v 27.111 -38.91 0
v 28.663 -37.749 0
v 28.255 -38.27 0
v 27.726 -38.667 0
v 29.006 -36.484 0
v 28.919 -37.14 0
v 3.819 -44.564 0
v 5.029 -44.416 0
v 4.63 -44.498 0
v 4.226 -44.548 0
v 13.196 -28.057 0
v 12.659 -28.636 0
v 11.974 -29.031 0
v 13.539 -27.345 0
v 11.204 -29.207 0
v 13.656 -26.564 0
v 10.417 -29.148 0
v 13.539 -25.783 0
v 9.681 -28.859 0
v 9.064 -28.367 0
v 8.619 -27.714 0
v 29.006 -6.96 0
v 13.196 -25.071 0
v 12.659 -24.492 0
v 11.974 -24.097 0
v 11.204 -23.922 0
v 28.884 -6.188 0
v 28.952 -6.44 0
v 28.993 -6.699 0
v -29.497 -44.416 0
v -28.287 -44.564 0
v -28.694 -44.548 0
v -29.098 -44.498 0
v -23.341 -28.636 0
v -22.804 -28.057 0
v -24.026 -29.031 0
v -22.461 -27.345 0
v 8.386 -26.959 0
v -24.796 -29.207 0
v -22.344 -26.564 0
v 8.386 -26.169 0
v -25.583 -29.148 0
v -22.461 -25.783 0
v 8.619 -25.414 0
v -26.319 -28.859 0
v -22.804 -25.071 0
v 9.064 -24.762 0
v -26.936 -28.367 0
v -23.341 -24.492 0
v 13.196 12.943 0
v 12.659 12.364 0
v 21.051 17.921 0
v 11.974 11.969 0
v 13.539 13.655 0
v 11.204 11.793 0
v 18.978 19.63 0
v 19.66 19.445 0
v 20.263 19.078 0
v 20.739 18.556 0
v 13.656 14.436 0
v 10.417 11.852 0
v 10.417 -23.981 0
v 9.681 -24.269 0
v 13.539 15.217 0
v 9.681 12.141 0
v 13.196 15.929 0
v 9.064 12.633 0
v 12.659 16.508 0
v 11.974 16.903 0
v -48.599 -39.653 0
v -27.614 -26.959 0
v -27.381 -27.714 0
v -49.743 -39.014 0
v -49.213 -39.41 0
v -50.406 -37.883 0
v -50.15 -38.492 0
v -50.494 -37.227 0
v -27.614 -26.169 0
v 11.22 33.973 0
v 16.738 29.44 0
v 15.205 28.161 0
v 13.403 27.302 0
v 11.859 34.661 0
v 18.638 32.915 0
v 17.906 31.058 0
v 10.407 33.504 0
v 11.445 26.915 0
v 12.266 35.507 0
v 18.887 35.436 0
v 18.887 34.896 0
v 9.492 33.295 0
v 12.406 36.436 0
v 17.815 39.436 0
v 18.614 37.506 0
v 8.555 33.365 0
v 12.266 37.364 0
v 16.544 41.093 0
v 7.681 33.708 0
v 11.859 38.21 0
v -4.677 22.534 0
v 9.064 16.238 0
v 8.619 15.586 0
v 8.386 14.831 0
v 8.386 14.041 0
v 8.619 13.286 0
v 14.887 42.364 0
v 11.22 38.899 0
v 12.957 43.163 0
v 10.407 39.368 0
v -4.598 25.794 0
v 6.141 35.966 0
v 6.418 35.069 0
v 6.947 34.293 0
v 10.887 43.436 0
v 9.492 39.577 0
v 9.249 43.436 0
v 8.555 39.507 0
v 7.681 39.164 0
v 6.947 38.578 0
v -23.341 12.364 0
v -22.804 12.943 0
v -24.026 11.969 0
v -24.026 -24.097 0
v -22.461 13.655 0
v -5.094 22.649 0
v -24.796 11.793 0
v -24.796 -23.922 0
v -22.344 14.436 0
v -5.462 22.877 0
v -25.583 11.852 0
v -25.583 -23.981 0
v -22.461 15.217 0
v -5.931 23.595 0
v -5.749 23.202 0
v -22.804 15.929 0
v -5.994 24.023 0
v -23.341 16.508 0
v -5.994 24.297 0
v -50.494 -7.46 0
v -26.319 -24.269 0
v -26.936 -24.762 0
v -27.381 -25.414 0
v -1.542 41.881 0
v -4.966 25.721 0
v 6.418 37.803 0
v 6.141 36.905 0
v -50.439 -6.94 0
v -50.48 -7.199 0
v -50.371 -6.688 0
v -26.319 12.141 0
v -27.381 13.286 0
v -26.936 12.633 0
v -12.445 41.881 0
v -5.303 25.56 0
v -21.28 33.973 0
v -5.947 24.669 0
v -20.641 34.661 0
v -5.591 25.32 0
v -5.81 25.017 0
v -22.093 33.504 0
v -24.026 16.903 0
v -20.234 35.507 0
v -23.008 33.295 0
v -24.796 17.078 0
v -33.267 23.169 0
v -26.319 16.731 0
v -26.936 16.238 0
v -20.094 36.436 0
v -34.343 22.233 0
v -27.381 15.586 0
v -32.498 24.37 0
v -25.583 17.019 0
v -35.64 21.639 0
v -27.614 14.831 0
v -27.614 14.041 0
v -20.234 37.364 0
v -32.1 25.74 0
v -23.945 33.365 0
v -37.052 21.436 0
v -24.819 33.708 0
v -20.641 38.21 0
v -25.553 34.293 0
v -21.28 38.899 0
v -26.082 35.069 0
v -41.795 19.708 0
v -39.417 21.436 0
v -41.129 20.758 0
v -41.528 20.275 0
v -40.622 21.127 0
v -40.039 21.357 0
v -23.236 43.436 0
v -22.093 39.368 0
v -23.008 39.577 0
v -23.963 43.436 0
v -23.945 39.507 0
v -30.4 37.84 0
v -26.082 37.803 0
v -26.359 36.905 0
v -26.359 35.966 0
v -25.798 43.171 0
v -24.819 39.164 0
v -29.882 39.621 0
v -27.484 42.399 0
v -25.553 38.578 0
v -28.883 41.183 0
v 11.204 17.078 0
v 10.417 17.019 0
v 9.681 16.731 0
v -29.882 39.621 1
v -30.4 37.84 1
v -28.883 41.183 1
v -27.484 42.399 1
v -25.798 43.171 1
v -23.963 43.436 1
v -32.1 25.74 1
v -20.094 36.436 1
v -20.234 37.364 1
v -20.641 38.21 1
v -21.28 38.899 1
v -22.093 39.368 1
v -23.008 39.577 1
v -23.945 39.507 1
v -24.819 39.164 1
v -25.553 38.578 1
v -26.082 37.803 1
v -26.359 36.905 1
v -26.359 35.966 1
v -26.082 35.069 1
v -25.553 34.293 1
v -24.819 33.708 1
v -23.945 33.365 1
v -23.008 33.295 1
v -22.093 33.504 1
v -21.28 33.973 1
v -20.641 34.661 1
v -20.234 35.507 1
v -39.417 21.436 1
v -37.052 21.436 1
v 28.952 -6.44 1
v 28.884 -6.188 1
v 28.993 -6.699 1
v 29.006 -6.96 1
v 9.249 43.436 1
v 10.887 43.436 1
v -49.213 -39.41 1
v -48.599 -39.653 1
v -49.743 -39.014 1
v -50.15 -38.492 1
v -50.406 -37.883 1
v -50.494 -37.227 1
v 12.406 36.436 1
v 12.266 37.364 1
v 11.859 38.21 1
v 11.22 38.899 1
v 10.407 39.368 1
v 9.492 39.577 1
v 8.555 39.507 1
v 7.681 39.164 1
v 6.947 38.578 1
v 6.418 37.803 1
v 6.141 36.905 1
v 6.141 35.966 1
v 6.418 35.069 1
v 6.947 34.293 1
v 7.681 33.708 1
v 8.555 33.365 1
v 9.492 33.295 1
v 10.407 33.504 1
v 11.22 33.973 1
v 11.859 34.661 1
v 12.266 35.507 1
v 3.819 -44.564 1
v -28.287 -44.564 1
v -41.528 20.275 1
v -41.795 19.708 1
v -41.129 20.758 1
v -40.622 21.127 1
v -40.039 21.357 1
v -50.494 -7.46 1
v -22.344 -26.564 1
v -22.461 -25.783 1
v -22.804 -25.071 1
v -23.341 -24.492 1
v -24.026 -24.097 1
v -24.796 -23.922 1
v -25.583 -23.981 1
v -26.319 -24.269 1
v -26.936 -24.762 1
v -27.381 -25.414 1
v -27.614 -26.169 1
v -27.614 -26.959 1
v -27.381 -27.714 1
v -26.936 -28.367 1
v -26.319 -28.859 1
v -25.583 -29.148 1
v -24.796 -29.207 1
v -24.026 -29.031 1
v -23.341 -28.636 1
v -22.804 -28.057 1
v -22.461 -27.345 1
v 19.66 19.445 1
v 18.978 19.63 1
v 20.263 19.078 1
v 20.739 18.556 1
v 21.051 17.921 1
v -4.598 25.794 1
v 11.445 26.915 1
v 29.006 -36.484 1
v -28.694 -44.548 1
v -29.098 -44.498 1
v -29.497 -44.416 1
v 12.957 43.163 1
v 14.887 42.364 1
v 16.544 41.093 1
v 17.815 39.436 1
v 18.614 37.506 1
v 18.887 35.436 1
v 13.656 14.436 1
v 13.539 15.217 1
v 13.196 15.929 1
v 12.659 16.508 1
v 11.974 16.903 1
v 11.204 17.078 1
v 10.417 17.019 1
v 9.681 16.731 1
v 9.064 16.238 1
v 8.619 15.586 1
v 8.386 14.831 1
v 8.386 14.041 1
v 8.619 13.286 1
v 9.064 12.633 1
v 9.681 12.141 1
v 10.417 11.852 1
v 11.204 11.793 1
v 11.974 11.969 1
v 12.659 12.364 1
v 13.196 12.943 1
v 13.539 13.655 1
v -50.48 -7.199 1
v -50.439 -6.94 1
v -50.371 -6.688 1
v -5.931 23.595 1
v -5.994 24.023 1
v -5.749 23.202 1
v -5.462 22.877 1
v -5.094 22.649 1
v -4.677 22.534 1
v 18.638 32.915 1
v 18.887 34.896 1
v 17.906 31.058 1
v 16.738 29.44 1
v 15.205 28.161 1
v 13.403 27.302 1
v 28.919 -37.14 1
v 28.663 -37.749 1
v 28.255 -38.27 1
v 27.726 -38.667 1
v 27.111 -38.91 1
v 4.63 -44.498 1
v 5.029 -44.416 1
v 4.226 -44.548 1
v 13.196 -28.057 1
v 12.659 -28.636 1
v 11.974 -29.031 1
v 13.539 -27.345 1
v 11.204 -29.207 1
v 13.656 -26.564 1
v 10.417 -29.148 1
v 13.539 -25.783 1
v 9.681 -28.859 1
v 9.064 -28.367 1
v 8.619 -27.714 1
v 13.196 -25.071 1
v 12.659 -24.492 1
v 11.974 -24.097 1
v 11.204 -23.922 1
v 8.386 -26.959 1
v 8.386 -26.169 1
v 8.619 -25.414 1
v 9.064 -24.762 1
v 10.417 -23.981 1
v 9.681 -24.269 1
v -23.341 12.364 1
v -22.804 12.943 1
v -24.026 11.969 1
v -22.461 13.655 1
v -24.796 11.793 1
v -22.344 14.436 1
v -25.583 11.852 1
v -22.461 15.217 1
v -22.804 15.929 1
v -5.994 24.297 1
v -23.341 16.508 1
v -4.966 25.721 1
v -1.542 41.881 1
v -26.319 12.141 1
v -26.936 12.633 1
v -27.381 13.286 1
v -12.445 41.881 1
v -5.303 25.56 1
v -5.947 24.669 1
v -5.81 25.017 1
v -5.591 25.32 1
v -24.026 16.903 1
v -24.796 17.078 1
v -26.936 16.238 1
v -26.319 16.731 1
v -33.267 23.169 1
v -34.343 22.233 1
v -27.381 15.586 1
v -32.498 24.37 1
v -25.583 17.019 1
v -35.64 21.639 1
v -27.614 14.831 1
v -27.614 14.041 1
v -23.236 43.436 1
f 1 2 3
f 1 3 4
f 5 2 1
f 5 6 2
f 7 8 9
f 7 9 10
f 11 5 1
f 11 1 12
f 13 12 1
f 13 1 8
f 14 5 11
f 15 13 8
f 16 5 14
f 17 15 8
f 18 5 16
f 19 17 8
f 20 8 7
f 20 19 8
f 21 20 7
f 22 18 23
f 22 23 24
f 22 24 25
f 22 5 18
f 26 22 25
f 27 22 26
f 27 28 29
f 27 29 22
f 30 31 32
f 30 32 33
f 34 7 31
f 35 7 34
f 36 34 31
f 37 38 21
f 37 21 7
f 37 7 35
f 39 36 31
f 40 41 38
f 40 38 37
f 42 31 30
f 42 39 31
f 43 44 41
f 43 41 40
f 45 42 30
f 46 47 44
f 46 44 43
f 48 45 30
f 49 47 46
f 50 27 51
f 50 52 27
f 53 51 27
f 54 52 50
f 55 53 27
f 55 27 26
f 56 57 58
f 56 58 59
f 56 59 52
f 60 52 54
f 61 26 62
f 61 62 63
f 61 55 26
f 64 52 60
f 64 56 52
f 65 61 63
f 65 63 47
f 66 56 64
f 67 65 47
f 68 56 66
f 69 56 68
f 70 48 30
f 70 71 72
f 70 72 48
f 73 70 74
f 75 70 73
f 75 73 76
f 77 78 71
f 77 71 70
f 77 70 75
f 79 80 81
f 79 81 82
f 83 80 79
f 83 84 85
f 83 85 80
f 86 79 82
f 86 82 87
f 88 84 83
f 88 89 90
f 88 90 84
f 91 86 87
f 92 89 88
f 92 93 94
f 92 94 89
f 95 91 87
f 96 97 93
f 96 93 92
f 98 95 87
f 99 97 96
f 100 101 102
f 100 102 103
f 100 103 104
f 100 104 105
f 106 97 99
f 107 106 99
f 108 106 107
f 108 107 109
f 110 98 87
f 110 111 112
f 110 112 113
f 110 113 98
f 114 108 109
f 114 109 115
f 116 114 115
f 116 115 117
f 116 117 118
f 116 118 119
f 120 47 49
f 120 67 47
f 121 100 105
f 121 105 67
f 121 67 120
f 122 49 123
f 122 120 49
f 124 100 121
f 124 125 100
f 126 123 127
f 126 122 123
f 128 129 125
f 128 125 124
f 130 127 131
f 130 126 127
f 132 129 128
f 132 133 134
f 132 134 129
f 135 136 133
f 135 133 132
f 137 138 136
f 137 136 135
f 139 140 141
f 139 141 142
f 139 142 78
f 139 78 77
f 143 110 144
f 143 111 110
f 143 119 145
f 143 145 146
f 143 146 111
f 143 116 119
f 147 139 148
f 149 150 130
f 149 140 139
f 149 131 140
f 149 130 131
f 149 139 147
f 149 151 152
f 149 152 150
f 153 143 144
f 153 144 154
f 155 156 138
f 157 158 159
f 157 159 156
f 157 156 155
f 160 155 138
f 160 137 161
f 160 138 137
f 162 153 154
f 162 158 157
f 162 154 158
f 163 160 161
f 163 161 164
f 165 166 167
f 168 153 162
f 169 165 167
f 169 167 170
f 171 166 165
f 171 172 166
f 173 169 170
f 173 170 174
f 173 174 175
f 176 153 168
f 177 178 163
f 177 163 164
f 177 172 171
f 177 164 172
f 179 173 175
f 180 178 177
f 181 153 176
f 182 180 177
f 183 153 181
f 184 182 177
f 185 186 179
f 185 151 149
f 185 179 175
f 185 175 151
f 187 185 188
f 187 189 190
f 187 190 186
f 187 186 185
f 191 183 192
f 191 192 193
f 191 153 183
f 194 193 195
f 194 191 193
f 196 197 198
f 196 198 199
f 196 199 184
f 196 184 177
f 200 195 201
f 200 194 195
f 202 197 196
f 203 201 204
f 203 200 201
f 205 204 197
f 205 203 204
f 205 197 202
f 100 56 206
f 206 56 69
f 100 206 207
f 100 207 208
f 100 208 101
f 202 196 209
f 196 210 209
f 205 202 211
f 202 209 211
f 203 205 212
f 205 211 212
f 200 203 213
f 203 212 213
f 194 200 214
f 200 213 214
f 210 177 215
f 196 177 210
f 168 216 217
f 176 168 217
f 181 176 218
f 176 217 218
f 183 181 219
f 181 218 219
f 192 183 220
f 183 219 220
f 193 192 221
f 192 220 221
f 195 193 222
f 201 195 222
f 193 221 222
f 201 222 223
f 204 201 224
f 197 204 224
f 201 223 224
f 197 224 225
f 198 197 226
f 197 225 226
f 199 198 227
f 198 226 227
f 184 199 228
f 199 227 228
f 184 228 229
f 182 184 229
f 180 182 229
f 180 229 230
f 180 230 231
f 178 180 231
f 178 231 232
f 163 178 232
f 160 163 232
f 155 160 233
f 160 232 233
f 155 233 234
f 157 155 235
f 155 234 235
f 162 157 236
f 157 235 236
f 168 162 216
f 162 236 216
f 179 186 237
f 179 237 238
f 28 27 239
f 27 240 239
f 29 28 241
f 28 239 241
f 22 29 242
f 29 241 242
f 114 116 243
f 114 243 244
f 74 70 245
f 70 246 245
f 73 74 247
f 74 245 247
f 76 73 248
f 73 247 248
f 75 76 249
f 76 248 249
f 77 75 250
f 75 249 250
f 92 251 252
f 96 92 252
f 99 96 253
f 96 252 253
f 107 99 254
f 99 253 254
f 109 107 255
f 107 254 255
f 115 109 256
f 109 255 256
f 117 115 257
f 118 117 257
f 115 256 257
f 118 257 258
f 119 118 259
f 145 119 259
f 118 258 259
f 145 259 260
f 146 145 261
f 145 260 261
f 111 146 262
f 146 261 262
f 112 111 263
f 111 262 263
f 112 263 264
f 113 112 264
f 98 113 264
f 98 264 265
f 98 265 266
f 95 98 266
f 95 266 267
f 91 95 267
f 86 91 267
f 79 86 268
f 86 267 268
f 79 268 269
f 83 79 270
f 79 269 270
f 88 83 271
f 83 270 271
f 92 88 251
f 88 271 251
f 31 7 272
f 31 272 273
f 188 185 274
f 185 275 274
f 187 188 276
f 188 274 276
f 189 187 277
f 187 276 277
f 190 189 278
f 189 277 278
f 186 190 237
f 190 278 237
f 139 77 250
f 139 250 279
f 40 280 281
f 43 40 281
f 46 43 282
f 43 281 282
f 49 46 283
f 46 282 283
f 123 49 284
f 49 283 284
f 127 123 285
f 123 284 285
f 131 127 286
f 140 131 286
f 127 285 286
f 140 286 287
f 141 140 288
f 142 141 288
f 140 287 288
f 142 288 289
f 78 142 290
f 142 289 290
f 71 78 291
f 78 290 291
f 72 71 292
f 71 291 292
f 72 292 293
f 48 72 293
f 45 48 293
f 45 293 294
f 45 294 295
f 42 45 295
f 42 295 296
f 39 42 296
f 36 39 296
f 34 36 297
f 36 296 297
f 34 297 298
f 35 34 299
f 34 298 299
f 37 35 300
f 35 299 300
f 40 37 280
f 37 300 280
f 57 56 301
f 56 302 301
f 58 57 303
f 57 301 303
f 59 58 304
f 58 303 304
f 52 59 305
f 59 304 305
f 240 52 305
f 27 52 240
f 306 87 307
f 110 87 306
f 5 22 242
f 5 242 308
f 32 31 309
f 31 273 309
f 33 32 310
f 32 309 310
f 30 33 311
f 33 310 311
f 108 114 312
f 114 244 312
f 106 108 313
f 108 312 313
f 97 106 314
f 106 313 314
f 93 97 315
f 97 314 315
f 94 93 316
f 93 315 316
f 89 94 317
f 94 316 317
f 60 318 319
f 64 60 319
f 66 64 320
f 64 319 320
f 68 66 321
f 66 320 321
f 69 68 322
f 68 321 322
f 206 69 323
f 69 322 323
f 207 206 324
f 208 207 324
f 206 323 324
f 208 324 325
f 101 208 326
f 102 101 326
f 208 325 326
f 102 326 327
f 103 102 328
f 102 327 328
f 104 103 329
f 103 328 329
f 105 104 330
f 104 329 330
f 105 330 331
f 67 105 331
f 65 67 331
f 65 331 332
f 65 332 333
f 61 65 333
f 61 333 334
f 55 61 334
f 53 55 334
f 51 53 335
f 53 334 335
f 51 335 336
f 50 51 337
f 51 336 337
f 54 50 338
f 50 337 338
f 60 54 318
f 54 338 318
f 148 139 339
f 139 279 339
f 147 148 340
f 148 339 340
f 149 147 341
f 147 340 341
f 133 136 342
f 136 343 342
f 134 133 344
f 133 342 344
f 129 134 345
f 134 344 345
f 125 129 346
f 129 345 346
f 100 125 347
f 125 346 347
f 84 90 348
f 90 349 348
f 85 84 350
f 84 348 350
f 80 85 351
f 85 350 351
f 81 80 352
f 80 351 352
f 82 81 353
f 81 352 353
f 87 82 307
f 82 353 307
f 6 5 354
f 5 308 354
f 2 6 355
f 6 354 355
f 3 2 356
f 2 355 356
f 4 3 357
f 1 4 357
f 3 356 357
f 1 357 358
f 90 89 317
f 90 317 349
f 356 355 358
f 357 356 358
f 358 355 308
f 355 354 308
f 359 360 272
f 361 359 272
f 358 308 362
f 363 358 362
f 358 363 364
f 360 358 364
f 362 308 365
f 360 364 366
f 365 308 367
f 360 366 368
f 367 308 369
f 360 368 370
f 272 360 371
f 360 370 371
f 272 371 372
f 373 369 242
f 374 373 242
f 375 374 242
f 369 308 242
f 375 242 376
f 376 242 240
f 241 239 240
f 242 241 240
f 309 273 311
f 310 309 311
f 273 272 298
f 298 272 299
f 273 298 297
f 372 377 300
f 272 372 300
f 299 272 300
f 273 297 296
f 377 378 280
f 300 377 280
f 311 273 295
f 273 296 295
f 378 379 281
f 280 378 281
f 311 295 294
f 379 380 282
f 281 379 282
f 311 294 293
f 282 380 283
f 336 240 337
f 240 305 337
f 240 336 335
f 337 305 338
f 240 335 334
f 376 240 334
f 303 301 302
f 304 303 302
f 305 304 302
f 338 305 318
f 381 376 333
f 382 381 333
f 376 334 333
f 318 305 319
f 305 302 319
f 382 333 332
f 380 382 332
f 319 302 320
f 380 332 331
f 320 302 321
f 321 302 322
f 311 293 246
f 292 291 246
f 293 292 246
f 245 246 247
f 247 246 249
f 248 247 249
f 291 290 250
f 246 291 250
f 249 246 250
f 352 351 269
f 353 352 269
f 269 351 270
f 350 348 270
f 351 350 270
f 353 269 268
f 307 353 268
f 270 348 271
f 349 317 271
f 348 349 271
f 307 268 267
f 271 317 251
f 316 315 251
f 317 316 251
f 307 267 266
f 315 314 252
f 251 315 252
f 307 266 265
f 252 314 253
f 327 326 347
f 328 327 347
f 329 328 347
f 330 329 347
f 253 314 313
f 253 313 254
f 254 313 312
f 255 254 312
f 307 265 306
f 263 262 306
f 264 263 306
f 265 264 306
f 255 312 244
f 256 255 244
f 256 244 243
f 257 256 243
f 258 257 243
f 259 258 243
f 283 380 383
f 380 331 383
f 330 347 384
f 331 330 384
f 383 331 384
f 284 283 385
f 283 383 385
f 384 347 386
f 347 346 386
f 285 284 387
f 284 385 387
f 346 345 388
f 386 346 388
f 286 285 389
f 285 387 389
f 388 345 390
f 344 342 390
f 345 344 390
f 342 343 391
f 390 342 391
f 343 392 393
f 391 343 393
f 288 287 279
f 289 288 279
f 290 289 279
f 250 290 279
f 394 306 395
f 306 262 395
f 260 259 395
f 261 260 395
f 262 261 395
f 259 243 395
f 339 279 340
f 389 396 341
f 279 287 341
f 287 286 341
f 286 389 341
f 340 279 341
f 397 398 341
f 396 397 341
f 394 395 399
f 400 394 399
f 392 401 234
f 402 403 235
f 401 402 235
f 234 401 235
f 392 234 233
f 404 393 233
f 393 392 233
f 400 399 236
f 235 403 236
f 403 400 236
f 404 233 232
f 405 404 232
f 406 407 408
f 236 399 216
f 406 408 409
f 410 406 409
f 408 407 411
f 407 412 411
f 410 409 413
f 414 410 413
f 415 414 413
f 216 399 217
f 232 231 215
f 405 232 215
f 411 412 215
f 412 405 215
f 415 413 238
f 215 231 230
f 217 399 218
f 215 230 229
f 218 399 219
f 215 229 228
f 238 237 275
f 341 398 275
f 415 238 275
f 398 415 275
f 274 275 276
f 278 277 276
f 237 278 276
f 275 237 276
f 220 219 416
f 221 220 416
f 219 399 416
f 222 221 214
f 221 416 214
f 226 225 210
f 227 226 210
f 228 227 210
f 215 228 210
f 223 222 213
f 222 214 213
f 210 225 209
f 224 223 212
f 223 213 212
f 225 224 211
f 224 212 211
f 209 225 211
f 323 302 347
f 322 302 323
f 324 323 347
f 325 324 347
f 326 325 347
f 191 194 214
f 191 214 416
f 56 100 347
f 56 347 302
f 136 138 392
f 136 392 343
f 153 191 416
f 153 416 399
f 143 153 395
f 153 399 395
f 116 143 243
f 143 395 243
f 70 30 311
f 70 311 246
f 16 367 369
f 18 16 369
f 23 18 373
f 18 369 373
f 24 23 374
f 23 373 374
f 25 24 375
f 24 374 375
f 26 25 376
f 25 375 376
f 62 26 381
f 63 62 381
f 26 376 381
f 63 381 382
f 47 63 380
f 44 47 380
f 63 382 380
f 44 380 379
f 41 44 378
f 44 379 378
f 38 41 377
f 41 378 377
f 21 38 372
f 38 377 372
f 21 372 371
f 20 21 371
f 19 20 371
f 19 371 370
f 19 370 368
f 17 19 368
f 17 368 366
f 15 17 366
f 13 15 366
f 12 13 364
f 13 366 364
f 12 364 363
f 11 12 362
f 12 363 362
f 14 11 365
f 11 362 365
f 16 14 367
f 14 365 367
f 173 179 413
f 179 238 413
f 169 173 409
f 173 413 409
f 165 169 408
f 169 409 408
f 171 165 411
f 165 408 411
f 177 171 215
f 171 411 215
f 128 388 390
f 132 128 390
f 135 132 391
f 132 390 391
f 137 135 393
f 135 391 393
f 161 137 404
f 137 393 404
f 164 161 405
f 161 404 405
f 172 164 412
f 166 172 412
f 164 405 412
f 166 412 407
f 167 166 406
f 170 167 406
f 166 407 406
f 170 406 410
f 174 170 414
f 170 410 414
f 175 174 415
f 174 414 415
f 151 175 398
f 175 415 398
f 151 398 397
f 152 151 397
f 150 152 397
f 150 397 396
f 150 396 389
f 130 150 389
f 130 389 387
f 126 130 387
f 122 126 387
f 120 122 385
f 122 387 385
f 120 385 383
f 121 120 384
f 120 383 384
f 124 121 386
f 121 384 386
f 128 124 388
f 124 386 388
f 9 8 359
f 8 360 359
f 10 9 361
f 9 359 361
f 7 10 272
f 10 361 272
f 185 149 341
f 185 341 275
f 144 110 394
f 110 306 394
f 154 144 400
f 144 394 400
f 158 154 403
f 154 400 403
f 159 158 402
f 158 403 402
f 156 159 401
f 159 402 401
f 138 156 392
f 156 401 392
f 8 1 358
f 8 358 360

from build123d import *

# Parameters (mm, degrees)
RESSALTO_EXTRUS_O1_DEPTH = 1
FILETE1_R                = 5
FILETE2_R                = 6.5
FILETE3_R                = 8
FILETE4_R                = 1.5
FILETE5_R                = 2.5
FILETE6_R                = 2.5
FILETE7_R                = 2.5
FILETE9_R                = 5
FILETE10_R               = 2.5
FILETE11_R               = 2.5
ESBO_O2_R                = 2.65
ESBO_O2_R_2              = 3.15
CORTE_EXTRUS_O1_DEPTH    = 1
ESBO_O3_R                = 76.25
CORTE_EXTRUS_O2_DEPTH    = 1


with BuildPart() as part:
    # Esboço1 → Ressalto-extrusão1 (new body)
    with BuildSketch(Plane.XY):
        Polygon((-28.900998415, -44.564212679), (-50.493725783, -39.180541088), (-50.493725783, -7.064212679), (-41.23351444, 21.435787321), (-32.705131271, 21.435787321), (-29.613232907, 43.435787321), (18.886767093, 43.435787321), (18.886767093, 27.435787321), (-5.993725783, 25.695973775), (-5.993725783, 22.695973775), (20.558362115, 19.435787321), (29.006274217, -6.564212679), (29.006274217, -38.437470915), (4.433255164, -44.564212679), align=None)
    extrude(amount=RESSALTO_EXTRUS_O1_DEPTH)

    # Filete1
    filete1_edges = [part.edges().sort_by_distance(p)[0] for p in [
        (-32.705131271, 21.435787321, 0.5),
    ]]
    fillet(filete1_edges, radius=FILETE1_R)

    # Filete2
    filete2_edges = [part.edges().sort_by_distance(p)[0] for p in [
        (-29.613232907, 43.435787321, 0.5),
    ]]
    fillet(filete2_edges, radius=FILETE2_R)

    # Filete3
    filete3_edges = [part.edges().sort_by_distance(p)[0] for p in [
        (18.886767093, 43.435787321, 0.5),
        (18.886767093, 27.435787321, 0.5),
    ]]
    fillet(filete3_edges, radius=FILETE3_R)

    # Filete4
    filete4_edges = [part.edges().sort_by_distance(p)[0] for p in [
        (-5.993725783, 25.695973775, 0.5),
        (-5.993725783, 22.695973775, 0.5),
    ]]
    fillet(filete4_edges, radius=FILETE4_R)

    # Filete5
    filete5_edges = [part.edges().sort_by_distance(p)[0] for p in [
        (20.558362115, 19.435787321, 0.5),
    ]]
    fillet(filete5_edges, radius=FILETE5_R)

    # Filete6
    filete6_edges = [part.edges().sort_by_distance(p)[0] for p in [
        (29.006274217, -6.564212679, 0.5),
    ]]
    fillet(filete6_edges, radius=FILETE6_R)

    # Filete7
    filete7_edges = [part.edges().sort_by_distance(p)[0] for p in [
        (29.006274217, -38.437470915, 0.5),
    ]]
    fillet(filete7_edges, radius=FILETE7_R)

    # Filete9
    filete9_edges = [part.edges().sort_by_distance(p)[0] for p in [
        (-28.900998415, -44.564212679, 0.5),
        (4.433255164, -44.564212679, 0.5),
    ]]
    fillet(filete9_edges, radius=FILETE9_R)

    # Filete10
    filete10_edges = [part.edges().sort_by_distance(p)[0] for p in [
        (-50.493725783, -39.180541088, 0.5),
        (-50.493725783, -7.064212679, 0.5),
    ]]
    fillet(filete10_edges, radius=FILETE10_R)

    # Filete11
    filete11_edges = [part.edges().sort_by_distance(p)[0] for p in [
        (-41.23351444, 21.435787321, 0.5),
    ]]
    fillet(filete11_edges, radius=FILETE11_R)

    # Esboço2 → Corte-extrusão1 (cut)
    with BuildSketch(Plane.XY.offset(1)):
        with Locations((-24.993725783, -26.564212679)):
            Circle(ESBO_O2_R)
        with Locations((11.006274217, -26.564212679)):
            Circle(ESBO_O2_R)
        with Locations((-24.993725783, 14.435787321)):
            Circle(ESBO_O2_R)
        with Locations((11.006274217, 14.435787321)):
            Circle(ESBO_O2_R)
        with Locations((-23.243725783, 36.435787321)):
            Circle(ESBO_O2_R_2)
        with Locations((9.256274217, 36.435787321)):
            Circle(ESBO_O2_R_2)
    extrude(amount=-CORTE_EXTRUS_O1_DEPTH, mode=Mode.SUBTRACT)

    # Esboço3 → Corte-extrusão2 (cut)
    with BuildSketch(Plane.XY.offset(1)):
        with Locations((-6.993725783, 117.935787321)):
            Circle(ESBO_O3_R)
    extrude(amount=-CORTE_EXTRUS_O2_DEPTH, mode=Mode.SUBTRACT)


solid = part.part
